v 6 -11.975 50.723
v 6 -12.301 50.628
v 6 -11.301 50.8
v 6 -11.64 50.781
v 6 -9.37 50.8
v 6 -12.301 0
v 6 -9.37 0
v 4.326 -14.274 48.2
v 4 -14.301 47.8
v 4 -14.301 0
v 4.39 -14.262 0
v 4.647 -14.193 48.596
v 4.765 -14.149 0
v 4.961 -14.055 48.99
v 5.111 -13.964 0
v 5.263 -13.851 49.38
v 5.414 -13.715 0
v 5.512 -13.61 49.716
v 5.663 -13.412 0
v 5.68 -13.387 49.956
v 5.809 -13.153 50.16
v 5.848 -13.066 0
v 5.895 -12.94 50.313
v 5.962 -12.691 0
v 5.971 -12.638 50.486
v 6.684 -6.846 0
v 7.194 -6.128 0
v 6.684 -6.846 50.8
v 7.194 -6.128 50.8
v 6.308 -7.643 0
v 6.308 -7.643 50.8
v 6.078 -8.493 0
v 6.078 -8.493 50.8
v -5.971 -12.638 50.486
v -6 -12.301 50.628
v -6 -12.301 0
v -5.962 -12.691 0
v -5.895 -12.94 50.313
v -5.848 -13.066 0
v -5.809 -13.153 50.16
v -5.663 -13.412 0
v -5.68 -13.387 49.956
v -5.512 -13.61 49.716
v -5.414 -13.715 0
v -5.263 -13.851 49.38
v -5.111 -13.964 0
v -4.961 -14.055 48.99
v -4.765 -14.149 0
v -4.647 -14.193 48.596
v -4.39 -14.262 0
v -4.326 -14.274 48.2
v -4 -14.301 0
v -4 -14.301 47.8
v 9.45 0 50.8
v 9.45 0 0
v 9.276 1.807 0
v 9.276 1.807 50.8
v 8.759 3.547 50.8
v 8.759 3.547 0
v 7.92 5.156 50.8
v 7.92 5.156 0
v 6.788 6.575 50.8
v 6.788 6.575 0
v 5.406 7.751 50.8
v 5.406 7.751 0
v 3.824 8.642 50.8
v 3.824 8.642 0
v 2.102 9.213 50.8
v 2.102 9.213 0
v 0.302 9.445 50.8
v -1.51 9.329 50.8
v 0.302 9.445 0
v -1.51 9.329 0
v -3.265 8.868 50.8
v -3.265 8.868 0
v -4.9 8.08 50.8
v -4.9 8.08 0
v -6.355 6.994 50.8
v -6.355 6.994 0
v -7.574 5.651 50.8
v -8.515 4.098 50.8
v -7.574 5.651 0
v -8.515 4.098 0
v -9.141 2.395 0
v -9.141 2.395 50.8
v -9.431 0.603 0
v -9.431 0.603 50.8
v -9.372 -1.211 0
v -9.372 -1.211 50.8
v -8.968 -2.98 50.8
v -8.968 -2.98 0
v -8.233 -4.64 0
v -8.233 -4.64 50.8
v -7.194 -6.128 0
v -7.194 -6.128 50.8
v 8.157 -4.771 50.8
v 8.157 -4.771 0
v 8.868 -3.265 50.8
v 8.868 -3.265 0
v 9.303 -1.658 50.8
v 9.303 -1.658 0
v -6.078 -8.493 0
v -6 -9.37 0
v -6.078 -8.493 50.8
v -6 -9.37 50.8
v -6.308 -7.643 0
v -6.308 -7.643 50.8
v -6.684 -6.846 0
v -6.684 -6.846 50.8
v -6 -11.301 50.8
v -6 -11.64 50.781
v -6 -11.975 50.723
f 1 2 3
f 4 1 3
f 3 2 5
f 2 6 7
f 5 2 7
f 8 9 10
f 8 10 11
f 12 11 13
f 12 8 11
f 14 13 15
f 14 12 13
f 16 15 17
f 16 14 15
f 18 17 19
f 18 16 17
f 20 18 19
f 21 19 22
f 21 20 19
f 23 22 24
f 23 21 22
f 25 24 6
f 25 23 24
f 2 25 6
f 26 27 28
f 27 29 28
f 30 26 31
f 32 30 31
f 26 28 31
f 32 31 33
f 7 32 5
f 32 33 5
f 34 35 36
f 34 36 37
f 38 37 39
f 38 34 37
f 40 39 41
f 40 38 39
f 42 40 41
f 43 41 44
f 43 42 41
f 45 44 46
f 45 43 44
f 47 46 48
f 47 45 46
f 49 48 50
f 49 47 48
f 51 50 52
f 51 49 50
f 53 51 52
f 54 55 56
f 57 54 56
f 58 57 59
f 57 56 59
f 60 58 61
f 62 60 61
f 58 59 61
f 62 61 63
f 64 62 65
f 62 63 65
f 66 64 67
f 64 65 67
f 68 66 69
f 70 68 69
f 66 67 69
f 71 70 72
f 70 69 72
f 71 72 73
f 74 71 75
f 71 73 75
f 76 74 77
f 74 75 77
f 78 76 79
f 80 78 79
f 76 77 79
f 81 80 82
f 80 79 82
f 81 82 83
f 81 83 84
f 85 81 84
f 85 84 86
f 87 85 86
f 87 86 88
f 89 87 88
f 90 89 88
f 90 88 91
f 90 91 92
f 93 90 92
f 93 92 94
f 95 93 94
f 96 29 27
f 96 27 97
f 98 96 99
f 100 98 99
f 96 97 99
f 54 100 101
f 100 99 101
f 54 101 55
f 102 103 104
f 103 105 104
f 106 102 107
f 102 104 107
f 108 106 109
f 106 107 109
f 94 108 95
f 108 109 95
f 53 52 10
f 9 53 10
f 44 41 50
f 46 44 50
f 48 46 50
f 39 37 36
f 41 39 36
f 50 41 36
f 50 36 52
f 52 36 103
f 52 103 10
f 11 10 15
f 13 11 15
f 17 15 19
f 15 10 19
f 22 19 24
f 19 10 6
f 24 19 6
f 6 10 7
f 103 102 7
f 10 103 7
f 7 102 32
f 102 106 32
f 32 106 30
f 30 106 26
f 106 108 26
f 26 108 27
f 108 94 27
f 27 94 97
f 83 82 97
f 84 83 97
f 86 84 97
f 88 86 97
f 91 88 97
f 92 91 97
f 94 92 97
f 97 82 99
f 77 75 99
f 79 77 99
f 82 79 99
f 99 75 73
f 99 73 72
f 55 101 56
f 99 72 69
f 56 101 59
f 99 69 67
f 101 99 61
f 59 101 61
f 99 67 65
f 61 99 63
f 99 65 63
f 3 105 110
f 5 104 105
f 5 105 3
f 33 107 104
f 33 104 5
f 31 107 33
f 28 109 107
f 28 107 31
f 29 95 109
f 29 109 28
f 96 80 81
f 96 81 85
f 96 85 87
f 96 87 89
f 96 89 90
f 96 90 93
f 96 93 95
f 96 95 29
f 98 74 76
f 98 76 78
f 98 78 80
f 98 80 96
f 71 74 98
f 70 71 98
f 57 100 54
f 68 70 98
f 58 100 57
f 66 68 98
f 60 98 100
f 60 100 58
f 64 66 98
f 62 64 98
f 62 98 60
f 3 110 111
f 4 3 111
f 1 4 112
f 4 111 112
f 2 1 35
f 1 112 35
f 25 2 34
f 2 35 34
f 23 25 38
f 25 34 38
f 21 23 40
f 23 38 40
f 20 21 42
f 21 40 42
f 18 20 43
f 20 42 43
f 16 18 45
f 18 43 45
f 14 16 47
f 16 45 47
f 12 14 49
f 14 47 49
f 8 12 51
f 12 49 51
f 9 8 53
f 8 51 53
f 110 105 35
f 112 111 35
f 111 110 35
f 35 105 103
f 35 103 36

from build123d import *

# Parameters (mm, degrees)
F1_DEPTH    = 50.8
F2_R        = 2
F3_R        = 5
F4_T1_DEPTH = 23


# Not quite as in the source:
# - a fillet or chamfer that OpenCascade refuses, or shapes differently, is made with other operations: its cross-section is extruded or revolved along the edge and cut away or added


with BuildPart() as f1:
    # F0 (on Top) → F1 (new body)
    with BuildSketch(Plane.XY):
        with BuildLine():
            ThreePointArc((6, -7.3008561142), (8.5440768957, -4.0374806501), (9.45, 0))
            ThreePointArc((9.45, 0), (-4.0374806501, 8.5440768957), (-6, -7.3008561142))
            ThreePointArc((-6, -7.3008561142), (0, -9.45), (6, -7.3008561142))
        make_face()
        with BuildLine():
            ThreePointArc((6, -7.3008561142), (0, -9.45), (-6, -7.3008561142))
            Line((-6, -7.3008561142), (-6, -14.3008561142))
            Line((-6, -14.3008561142), (0, -14.3008561142))
            Line((0, -14.3008561142), (6, -14.3008561142))
            Line((6, -14.3008561142), (6, -7.3008561142))
        make_face()
    extrude(amount=F1_DEPTH)

    # F2
    f2_edges = [f1.edges().sort_by_distance(p)[0] for p in [
        (6, -14.300856, 25.4),
        (-6, -14.300856, 25.4),
    ]]
    fillet(f2_edges, radius=F2_R)

    # F3
    f3_edges = [f1.edges().sort_by_distance(p)[0] for p in [
        (-6, -7.300856, 25.4),
        (6, -7.300856, 25.4),
    ]]
    fillet(f3_edges, radius=F3_R)

    # F4: fillet of radius 3 on 1 edges, made by hand

    # F4_s2 → F4_t1 (cut)
    with BuildSketch(Plane.YZ.offset(-11.5)):
        with BuildLine():
            ThreePointArc((-11.3008561142, 50.8), (-13.4221764577, 49.9213203436), (-14.3008561142, 47.8))
            Line((-14.3008561142, 47.8), (-14.3008561142, 50.8))
            Line((-14.3008561142, 50.8), (-11.3008561142, 50.8))
        make_face()
    extrude(amount=F4_T1_DEPTH, mode=Mode.SUBTRACT)


solid = f1.part
